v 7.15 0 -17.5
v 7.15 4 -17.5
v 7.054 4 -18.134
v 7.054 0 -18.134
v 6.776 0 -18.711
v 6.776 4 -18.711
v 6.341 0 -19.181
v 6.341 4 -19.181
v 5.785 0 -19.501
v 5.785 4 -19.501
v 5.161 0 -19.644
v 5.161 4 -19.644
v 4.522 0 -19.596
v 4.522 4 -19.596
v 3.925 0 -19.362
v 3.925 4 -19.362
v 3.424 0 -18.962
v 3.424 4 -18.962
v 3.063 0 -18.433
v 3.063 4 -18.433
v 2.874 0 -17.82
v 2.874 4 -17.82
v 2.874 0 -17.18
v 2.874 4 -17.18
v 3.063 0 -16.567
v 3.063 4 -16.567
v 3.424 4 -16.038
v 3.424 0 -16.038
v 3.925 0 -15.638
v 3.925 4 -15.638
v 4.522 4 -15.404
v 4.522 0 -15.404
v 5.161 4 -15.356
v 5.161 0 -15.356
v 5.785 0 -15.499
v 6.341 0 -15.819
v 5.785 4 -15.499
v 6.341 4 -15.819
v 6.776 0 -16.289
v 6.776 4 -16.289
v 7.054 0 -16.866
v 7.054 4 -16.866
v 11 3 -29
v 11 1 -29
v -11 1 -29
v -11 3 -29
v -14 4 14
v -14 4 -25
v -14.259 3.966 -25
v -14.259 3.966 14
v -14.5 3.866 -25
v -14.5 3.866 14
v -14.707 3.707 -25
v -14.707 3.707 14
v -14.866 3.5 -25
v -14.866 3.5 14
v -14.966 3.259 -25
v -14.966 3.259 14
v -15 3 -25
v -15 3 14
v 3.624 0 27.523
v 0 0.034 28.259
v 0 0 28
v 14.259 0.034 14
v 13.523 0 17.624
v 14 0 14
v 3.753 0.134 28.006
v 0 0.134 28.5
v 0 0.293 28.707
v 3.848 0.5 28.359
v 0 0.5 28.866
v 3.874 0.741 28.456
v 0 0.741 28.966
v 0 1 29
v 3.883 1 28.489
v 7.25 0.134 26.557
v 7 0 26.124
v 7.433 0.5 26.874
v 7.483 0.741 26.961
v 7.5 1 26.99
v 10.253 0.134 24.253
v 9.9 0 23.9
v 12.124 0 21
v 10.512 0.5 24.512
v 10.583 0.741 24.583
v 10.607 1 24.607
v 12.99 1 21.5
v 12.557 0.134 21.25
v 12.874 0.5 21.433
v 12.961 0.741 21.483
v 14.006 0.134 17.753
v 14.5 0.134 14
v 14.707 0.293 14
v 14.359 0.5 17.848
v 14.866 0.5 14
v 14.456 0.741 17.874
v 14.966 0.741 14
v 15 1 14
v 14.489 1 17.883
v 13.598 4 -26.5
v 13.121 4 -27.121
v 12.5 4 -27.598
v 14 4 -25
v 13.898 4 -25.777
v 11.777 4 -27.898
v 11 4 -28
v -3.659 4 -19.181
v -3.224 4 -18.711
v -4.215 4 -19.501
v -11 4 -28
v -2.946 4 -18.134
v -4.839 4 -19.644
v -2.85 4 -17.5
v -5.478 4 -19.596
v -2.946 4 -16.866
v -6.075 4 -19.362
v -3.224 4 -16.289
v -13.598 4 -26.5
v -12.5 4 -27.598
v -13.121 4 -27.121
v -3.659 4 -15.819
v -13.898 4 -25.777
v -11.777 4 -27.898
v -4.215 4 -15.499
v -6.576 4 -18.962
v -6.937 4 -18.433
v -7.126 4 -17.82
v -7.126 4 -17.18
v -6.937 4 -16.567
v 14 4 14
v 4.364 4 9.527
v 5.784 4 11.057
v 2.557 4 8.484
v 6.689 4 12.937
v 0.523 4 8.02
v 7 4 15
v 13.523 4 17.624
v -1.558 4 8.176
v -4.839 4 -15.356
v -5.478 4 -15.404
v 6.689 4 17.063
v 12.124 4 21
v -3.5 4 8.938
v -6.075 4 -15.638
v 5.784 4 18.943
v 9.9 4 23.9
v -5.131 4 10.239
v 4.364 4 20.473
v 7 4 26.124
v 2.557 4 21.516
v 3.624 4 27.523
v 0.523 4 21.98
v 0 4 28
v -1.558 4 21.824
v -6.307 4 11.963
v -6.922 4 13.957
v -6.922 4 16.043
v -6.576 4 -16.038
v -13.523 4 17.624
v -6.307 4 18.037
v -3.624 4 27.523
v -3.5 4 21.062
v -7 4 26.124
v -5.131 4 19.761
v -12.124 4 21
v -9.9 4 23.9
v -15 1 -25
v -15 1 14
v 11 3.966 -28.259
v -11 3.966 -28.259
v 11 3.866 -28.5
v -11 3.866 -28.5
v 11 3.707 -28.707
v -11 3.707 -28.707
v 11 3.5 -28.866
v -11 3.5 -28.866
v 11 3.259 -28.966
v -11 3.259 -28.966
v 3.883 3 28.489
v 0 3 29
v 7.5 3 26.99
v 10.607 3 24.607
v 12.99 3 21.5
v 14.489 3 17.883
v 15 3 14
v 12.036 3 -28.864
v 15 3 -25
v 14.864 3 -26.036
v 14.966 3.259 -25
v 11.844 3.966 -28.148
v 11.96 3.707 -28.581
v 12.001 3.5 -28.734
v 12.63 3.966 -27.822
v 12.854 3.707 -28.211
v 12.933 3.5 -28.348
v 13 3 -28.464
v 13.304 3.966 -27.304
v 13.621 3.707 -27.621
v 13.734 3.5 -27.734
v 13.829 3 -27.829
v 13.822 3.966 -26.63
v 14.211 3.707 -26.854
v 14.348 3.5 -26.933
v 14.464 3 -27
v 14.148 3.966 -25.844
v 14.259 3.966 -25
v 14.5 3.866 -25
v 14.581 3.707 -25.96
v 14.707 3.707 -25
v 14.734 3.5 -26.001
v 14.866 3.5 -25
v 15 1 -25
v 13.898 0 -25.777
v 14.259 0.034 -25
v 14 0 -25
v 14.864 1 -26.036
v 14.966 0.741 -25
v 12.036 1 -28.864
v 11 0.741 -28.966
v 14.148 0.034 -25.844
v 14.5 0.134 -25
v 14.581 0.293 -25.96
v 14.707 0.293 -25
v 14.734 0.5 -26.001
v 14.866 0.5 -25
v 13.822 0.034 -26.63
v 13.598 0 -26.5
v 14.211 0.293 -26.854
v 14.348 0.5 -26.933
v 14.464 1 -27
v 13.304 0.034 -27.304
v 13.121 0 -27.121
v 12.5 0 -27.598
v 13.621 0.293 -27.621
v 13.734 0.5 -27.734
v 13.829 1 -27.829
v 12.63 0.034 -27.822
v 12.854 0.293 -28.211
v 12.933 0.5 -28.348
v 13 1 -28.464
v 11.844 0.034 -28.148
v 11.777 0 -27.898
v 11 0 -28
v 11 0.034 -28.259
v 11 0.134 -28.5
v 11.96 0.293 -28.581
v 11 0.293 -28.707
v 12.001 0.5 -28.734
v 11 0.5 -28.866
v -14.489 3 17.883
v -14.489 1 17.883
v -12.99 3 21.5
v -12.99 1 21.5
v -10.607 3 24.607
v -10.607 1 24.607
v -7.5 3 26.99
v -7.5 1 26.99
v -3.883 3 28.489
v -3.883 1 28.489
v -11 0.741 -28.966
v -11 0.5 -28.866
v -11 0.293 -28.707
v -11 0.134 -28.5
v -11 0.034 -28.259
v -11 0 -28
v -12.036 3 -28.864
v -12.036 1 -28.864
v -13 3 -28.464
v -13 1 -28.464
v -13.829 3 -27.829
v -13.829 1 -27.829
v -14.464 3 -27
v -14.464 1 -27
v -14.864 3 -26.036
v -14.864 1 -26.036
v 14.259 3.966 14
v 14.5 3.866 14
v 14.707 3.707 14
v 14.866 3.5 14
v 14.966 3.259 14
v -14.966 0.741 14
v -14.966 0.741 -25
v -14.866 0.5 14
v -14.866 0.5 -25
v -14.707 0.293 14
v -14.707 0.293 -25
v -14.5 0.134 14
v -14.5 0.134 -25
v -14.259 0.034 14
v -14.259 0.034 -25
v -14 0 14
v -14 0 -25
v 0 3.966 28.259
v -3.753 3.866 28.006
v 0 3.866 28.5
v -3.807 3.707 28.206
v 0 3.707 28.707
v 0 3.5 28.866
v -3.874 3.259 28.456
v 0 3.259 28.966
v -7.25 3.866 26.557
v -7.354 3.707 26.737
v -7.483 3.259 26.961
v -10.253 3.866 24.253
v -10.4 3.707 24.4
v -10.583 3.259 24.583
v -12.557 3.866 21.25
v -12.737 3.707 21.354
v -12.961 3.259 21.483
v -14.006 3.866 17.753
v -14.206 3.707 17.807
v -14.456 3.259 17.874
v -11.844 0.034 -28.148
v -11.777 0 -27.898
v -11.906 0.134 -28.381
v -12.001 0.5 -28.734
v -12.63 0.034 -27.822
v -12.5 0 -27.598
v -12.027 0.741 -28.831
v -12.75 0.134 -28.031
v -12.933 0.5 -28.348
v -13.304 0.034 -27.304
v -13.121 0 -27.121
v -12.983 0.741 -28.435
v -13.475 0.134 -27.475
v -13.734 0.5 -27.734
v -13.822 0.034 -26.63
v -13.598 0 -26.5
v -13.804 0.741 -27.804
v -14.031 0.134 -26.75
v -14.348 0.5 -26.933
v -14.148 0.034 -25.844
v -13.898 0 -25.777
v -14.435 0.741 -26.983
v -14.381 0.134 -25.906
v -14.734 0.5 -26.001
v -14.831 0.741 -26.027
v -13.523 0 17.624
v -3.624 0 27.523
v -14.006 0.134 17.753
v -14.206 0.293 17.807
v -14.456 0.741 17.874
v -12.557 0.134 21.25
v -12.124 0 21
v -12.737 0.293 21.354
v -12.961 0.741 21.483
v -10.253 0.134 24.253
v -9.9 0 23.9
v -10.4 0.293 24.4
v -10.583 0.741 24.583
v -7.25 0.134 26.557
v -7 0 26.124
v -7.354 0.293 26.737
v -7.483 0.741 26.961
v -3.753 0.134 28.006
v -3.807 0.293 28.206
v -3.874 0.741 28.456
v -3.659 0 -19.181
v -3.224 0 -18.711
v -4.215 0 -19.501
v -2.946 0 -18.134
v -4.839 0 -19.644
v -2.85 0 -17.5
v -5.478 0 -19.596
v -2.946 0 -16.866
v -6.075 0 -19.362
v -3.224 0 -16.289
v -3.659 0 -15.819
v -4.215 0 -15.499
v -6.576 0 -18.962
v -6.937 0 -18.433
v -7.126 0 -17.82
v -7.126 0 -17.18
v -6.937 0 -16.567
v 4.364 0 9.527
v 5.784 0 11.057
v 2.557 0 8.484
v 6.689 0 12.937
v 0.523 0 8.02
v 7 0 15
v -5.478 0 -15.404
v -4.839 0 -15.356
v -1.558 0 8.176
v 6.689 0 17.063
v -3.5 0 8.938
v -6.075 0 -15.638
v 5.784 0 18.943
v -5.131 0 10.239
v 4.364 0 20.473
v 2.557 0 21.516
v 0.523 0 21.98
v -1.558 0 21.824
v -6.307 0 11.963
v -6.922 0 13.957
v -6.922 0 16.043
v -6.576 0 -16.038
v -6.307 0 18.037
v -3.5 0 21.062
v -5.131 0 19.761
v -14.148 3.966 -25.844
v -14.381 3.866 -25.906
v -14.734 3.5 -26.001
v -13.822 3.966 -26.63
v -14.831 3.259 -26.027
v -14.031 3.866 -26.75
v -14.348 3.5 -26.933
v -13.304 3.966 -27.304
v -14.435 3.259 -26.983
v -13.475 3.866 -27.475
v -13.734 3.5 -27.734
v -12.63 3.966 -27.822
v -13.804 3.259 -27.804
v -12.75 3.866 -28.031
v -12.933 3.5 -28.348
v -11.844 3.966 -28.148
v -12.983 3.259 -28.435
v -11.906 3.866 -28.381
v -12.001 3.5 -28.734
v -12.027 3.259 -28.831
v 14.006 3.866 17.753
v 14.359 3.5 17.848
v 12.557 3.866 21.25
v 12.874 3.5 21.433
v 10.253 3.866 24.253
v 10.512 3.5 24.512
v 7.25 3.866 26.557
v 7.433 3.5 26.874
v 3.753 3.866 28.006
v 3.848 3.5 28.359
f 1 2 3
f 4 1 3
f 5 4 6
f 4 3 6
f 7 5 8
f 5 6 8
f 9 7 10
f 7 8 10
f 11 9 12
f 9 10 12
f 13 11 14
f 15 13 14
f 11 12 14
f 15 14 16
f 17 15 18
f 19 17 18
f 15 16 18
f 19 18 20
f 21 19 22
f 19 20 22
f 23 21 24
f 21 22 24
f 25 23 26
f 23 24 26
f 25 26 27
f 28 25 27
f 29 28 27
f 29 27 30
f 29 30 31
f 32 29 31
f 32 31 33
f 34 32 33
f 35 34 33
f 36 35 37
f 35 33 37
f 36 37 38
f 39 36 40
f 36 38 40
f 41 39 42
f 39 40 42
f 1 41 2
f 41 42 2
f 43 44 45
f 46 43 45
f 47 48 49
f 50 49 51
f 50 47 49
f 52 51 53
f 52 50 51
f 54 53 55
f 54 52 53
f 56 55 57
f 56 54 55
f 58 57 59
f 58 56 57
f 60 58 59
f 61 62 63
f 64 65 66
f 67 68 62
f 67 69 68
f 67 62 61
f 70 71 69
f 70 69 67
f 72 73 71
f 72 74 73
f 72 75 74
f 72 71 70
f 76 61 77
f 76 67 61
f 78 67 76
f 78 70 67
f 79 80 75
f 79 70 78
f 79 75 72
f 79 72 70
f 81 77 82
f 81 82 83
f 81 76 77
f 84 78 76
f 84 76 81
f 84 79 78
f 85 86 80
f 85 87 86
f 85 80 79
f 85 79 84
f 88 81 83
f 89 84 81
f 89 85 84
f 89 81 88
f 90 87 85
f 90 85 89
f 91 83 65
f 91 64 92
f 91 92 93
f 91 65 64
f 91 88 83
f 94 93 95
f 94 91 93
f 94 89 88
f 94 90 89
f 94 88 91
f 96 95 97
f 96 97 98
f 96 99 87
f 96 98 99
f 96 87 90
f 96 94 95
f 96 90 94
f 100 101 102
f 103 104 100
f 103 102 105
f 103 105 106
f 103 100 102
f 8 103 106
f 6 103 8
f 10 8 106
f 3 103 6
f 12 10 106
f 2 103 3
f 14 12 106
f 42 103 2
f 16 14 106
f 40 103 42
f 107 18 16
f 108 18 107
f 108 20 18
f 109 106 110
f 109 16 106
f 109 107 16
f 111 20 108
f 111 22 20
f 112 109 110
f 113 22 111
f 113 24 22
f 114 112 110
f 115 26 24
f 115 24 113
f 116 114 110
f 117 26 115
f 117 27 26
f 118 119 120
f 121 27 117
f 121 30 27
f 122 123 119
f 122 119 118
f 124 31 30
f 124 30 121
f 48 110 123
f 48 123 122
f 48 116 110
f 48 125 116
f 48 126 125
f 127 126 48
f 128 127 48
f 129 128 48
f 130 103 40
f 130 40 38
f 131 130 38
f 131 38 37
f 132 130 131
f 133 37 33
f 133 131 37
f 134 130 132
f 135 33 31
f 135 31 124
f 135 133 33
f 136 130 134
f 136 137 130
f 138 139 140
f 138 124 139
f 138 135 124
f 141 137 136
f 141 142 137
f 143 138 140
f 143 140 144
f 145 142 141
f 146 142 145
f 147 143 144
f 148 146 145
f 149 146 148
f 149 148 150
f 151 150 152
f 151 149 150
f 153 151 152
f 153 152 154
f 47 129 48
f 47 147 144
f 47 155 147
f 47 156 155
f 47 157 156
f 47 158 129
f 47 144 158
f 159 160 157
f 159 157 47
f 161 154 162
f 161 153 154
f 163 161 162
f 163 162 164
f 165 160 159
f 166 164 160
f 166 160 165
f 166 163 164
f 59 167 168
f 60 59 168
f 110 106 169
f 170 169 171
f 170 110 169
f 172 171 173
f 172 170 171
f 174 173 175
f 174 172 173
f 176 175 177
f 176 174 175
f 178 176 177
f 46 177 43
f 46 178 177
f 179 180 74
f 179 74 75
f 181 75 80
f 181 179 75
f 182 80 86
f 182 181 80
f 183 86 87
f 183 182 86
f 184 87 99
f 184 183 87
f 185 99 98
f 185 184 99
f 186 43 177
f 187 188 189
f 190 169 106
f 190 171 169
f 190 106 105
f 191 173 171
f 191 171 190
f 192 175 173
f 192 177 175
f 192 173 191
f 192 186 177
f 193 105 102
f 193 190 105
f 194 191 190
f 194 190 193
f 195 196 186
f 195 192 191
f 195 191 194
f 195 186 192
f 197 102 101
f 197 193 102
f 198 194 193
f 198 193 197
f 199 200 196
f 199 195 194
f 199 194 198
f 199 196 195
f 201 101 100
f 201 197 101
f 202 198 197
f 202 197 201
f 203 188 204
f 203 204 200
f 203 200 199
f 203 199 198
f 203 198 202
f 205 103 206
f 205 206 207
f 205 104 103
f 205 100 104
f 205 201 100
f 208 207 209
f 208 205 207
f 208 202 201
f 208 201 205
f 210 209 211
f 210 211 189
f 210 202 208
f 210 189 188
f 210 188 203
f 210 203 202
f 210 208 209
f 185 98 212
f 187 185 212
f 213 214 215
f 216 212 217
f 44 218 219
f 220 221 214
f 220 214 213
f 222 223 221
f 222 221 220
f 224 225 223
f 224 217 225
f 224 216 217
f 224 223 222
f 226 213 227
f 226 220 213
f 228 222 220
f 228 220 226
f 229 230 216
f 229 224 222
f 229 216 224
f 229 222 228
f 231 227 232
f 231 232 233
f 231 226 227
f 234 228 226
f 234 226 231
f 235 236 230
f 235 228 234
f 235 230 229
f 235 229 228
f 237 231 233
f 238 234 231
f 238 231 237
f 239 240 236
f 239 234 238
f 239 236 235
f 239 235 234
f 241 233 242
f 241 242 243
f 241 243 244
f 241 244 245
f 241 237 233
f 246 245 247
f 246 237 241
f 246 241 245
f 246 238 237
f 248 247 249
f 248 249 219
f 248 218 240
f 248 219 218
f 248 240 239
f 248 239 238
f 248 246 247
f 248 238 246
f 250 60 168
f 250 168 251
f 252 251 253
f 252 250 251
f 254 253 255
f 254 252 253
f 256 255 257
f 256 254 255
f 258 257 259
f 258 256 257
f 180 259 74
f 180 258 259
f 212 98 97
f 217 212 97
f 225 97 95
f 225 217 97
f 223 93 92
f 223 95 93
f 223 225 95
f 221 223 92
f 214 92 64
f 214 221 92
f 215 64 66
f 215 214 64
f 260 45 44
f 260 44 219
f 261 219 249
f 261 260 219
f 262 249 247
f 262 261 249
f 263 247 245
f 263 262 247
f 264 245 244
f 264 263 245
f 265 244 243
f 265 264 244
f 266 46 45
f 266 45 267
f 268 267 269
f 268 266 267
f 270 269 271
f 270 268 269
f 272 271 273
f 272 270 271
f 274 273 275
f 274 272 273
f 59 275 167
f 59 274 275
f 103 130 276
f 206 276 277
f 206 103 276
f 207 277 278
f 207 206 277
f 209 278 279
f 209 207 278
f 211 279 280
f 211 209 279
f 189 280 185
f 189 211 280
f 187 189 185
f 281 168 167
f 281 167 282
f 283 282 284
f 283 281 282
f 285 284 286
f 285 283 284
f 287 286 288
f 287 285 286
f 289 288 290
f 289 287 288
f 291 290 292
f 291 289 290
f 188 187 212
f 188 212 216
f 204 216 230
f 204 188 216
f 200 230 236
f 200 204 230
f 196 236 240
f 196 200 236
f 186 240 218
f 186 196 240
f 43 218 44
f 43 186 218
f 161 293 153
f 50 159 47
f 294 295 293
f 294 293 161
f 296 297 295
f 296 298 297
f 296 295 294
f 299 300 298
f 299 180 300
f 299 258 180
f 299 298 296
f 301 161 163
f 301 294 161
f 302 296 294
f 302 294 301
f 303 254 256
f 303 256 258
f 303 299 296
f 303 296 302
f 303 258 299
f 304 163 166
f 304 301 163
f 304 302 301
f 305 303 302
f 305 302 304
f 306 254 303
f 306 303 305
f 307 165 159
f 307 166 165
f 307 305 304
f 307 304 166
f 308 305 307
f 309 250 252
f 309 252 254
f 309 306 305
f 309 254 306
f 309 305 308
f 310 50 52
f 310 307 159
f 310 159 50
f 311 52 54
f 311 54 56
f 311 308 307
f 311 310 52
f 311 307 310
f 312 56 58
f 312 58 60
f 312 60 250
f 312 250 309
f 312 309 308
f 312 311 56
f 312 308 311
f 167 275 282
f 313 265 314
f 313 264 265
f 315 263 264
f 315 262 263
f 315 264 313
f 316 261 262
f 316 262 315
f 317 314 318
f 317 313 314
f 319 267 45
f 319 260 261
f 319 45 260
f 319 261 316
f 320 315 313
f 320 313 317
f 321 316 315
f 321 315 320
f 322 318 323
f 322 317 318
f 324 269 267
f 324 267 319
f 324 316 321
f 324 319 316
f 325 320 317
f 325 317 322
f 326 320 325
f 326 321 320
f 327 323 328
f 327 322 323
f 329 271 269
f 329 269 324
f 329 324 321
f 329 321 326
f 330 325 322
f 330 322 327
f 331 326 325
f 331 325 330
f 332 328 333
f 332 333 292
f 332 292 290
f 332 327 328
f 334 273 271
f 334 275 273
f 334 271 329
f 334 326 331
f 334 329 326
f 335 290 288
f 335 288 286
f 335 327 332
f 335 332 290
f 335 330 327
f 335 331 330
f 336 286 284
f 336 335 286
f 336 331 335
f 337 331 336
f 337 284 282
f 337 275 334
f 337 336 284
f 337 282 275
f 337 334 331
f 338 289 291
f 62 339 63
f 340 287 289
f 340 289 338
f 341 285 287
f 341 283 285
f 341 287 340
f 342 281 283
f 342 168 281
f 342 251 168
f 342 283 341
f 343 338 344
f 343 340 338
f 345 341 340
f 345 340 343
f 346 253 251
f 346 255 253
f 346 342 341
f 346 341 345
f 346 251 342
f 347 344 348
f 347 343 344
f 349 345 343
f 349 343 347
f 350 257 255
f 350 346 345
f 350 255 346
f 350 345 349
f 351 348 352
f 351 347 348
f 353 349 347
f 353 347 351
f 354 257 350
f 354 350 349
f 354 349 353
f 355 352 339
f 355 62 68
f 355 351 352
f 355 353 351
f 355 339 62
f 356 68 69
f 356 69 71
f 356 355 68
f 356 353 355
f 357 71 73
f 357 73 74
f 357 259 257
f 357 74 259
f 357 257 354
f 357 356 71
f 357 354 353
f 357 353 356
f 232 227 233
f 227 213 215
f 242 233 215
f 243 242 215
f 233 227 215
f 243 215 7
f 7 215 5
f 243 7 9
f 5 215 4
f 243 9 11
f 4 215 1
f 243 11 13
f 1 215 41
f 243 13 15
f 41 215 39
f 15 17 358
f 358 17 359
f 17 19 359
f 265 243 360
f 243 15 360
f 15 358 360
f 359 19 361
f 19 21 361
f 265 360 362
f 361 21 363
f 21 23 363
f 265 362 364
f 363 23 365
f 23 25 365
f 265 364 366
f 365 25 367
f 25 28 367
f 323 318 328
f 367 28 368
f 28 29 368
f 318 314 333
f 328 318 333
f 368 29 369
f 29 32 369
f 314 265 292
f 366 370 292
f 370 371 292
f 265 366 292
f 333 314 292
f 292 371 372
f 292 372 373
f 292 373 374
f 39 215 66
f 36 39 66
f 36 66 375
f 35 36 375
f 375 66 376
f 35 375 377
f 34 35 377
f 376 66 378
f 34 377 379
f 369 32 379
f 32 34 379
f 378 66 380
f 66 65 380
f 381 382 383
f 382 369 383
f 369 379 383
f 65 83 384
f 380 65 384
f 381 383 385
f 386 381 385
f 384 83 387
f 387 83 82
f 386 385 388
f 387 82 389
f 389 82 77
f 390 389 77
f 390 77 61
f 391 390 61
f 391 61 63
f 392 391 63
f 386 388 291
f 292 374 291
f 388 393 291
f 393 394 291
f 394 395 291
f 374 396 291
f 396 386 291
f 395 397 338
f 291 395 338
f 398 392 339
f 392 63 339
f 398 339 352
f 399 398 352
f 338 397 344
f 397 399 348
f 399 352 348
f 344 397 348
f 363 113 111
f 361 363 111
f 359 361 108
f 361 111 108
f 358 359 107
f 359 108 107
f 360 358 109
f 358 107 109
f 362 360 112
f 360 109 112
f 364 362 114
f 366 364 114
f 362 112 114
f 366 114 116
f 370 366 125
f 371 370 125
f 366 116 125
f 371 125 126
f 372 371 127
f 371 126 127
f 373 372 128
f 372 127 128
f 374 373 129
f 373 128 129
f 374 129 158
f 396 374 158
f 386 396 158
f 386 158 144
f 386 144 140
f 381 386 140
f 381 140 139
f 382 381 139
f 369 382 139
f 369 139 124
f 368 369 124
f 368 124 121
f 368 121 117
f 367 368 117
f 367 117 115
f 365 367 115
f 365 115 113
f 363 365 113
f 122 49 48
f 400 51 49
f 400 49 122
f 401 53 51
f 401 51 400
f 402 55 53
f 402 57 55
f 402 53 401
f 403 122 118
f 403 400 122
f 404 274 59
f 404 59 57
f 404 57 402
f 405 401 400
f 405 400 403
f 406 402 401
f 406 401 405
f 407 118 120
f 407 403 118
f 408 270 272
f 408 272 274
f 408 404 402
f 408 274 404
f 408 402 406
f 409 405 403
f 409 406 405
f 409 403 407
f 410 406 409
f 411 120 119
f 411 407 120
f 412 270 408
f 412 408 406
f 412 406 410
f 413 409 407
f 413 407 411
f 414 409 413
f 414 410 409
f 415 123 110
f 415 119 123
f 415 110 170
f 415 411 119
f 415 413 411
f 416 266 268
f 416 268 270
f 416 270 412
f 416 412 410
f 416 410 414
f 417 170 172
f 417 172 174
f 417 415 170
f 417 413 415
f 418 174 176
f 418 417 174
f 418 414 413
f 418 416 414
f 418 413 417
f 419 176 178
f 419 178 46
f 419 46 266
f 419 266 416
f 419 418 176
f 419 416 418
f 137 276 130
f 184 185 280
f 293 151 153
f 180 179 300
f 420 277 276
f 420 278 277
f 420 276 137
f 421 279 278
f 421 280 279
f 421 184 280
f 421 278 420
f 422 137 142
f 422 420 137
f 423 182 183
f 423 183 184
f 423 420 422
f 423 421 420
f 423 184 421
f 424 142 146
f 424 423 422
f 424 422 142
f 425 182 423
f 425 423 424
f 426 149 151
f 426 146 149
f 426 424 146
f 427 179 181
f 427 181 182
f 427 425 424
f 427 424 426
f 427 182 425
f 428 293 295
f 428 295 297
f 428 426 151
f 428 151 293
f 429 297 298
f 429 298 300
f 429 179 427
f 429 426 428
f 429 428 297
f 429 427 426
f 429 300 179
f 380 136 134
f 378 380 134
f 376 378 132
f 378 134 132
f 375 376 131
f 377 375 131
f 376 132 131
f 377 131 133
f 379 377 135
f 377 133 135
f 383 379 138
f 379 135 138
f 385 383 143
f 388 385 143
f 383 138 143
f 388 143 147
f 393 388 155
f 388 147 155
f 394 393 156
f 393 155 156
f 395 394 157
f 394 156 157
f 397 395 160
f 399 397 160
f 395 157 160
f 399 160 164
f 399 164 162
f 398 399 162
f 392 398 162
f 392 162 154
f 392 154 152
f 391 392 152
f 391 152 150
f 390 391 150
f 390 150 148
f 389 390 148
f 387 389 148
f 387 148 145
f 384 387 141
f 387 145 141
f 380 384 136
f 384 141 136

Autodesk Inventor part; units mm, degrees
ref_plane "YZ Plane" through (0, 0, 0) normal (1, 0, 0) x (0, 1, 0)
ref_plane "XZ Plane" through (0, 0, 0) normal (0, 1, 0) x (-1, 0, 0)
sketch "Sketch2" plane through (0, 0, 0) normal (0, 1, 0) x (-1, 0, 0)
  line L0 (15, 29) -> (-15, 29)
  line L1 (-15, 29) -> (-15, -29)
  line L2 (-15, -29) -> (15, -29)
  line L3 (15, -29) -> (15, 29)
  line L4 (0, 0) -> (0, -29) construction
  line L5 (0, 0) -> (0, 29) construction
  line L6 (0, 0) -> (15, 0) construction
  line L7 (0, 0) -> (-15, 0) construction
  dimension "d45" = 30
  dimension "d46" = 58
extrude "Main Body Sketch" add sketch "Sketch2" along normal blind 4
ref_plane "Work Plane1" through (0, 4, 0) normal (0, 1, 0) x (1, 0, 0)
sketch "Sketch4" plane through (0, 4, 0) normal (0, 1, 0) x (1, 0, 0)
  circle A0 centre (0, -15) radius 7
  circle A1 centre (5, 17.5) radius 2.15
  circle A2 centre (-5, 17.5) radius 2.15
  line L0 (15, 29) -> (-15, 29) projected
  line L1 (-15, 29) -> (-15, -29) projected
  dimension "d85" = 30
  dimension "d87" = 4.3
  dimension "d88" = 4.3
  dimension "d90" = 10
  dimension "d96" = 14
  dimension "d97" = 44
  dimension "d98" = 15
  dimension "d100" = 11.5
  dimension "d101" = 11.5
extrude "Holes Cuts" cut sketch "Sketch4" against normal up to surface (4 mm away)
fillet "Fillet12" radius 4 2 edges at (-15, 2, -29) (15, 2, -29)
fillet "Fillet12" radius 15 2 edges at (15, 2, 29) (-15, 2, 29)
fillet "Fillet13" radius 1 12 edges at (10.6067, 4, 24.6067) (15, 4, -5.5) (13.8286, 4, -27.8286) (0, 4, -29) (-13.8286, 4, -27.8286) (-15, 4, -5.5) (15, 0, -5.5) (13.8286, 0, -27.8286) (0, 0, -29) (-13.8286, 0, -27.8286) (-15, 0, -5.5) (10.6067, 0, 24.6067)
equation "\"d46\" = AH"
equation "\"AH\" = 58"
equation "\"d57\" = TMROL"
equation "\"BD\" = 4"
equation "\"TMROL\" = 45"
properties part number "Side Attatchment"
